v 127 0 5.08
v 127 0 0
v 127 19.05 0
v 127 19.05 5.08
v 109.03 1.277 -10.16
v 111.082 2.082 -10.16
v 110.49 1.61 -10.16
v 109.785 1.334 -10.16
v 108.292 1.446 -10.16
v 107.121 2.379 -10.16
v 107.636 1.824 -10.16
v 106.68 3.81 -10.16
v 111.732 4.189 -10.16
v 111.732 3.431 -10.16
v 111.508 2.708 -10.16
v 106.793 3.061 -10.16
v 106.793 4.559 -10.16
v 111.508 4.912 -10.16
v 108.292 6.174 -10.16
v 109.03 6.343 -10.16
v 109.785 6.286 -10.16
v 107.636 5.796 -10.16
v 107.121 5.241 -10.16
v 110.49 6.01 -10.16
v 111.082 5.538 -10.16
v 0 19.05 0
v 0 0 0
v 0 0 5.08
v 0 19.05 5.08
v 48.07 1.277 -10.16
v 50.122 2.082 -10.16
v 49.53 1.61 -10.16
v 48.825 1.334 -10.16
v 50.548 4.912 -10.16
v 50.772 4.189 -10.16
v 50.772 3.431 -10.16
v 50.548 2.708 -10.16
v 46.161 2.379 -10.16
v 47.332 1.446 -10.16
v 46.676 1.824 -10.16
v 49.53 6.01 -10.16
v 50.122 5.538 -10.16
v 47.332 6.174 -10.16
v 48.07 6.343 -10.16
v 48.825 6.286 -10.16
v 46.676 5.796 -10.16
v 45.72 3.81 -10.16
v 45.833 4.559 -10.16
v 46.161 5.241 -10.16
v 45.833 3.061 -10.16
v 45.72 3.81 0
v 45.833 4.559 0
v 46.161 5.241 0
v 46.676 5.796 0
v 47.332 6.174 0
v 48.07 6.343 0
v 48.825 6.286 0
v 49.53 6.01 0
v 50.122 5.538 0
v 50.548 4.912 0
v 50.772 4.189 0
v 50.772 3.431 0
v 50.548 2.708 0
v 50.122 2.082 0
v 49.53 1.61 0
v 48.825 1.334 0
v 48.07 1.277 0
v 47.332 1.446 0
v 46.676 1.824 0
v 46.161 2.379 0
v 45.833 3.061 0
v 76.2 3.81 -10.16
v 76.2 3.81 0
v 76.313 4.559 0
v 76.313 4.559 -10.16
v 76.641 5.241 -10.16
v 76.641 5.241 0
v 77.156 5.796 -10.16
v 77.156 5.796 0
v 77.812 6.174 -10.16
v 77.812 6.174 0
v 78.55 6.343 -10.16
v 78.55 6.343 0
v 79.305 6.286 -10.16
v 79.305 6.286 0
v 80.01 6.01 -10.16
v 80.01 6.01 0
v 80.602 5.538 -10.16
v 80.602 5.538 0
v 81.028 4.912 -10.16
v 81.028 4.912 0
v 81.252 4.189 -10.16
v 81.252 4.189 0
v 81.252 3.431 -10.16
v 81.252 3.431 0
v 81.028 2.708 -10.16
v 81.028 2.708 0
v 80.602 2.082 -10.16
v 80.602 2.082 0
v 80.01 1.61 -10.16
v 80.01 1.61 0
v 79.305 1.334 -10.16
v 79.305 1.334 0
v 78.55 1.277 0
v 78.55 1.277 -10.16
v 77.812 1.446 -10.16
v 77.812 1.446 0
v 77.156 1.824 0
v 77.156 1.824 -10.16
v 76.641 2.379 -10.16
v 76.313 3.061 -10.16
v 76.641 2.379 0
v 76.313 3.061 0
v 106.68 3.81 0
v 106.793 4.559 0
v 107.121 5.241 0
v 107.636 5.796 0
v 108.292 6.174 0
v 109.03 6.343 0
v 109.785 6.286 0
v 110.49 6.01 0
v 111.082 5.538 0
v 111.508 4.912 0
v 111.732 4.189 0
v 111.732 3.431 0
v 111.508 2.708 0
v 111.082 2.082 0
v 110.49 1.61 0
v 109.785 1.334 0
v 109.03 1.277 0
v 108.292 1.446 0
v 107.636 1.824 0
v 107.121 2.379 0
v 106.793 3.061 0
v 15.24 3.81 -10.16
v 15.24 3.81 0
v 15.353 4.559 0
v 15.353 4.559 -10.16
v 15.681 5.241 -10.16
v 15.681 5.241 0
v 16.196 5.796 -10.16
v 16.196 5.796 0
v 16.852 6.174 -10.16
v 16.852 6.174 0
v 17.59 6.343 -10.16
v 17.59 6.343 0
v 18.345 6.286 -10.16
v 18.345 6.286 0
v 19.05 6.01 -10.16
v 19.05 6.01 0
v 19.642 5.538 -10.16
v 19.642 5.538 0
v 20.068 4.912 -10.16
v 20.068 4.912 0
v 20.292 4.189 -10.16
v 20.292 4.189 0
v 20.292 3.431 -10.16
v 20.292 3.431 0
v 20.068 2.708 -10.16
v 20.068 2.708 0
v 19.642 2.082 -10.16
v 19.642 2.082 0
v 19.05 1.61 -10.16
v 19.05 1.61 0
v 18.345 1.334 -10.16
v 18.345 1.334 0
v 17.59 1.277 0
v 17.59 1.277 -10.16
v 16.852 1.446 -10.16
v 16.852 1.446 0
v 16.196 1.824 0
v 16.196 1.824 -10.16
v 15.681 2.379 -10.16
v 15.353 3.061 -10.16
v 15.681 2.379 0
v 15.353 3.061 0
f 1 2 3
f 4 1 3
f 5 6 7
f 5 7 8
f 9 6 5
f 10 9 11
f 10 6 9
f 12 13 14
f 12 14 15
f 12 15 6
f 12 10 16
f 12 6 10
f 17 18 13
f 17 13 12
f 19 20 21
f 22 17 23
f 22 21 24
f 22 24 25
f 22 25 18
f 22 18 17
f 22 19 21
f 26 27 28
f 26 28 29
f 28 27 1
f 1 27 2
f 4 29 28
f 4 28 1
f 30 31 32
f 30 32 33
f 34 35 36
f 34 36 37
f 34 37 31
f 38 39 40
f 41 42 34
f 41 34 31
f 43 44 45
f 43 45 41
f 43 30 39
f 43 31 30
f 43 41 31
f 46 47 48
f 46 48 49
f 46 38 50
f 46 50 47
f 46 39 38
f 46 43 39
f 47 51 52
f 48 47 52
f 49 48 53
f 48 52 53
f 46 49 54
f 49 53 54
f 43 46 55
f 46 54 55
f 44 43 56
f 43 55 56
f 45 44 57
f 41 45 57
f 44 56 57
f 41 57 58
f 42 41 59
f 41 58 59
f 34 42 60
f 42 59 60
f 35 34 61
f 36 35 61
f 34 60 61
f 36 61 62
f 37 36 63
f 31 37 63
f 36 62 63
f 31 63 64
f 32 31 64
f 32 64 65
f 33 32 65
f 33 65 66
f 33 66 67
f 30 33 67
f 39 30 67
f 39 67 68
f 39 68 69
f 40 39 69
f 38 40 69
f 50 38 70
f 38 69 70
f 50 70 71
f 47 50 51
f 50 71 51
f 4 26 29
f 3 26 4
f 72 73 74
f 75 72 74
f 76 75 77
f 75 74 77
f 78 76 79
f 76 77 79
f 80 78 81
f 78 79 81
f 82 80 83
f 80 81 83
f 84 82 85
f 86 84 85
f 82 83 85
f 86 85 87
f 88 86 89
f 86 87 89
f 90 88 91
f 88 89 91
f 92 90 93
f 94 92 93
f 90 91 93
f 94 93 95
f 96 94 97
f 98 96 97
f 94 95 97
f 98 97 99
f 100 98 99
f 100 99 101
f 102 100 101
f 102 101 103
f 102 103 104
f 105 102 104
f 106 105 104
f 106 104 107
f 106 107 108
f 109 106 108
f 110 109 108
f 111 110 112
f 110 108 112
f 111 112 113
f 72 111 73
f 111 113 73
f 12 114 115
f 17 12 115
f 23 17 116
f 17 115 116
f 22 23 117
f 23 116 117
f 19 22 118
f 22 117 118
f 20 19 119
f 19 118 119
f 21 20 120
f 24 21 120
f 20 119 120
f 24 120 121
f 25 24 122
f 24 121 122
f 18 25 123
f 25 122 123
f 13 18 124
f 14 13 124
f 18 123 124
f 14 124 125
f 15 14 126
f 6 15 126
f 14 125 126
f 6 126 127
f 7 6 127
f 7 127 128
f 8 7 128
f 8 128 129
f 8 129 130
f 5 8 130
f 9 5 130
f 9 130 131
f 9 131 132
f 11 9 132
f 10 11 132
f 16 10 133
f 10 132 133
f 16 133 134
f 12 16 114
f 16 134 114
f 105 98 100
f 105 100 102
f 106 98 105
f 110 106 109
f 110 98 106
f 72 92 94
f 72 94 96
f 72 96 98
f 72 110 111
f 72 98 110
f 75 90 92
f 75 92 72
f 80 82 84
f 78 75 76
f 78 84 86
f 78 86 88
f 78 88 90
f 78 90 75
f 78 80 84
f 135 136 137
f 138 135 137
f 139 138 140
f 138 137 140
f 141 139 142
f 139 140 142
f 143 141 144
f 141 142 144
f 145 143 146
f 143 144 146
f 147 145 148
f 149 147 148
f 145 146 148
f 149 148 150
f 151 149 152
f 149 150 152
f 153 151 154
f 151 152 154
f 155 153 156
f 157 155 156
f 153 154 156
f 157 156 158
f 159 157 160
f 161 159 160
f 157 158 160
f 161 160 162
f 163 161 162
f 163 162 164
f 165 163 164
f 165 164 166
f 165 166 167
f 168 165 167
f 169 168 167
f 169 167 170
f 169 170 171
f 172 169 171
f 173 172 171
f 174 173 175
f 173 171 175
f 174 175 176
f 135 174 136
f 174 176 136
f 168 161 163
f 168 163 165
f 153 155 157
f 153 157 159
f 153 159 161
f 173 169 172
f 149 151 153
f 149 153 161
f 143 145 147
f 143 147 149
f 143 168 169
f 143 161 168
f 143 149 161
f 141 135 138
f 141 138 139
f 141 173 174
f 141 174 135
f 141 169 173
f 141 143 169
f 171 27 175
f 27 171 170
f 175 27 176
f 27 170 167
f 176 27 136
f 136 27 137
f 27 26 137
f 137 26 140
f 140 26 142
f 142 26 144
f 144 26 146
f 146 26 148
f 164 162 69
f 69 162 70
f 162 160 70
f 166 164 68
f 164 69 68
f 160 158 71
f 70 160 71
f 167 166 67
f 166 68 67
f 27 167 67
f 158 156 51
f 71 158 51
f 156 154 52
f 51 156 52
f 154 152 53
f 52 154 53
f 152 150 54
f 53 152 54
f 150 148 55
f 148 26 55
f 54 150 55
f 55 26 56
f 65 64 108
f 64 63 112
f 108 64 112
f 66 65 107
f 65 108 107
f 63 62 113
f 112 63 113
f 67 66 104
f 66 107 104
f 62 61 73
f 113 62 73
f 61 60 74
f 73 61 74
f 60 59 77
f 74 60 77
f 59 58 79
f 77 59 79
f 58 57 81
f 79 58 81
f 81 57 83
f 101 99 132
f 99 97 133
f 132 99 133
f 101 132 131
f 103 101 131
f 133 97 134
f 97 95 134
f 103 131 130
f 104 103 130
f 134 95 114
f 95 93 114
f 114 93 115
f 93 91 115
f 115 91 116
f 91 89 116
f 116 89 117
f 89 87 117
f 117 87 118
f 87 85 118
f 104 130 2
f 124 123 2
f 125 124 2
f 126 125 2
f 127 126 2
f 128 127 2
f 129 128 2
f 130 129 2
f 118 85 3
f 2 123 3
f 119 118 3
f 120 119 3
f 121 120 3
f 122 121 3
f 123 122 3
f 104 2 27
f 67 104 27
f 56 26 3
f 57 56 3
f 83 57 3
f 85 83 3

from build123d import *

# Parameters (mm, degrees)
SKETCH1_W           = 127
SKETCH1_H           = 19.05
BOSS_EXTRUDE1_DEPTH = 5.08
SKETCH2_R           = 2.54
BOSS_EXTRUDE2_DEPTH = 10.16


with BuildPart() as part:
    # Sketch1 → Boss-Extrude1 (new body)
    with BuildSketch(Plane.XY):
        with Locations((63.5, 9.525)):
            Rectangle(SKETCH1_W, SKETCH1_H)
    extrude(amount=BOSS_EXTRUDE1_DEPTH)

    # Sketch2 → Boss-Extrude2 (add)
    with BuildSketch(Plane(origin=(0, 0, 0), x_dir=(-1, 0, 0), z_dir=(0, 0, -1))):
        with Locations((-109.22, 3.81)):
            Circle(SKETCH2_R)
        with Locations((-78.74, 3.81)):
            Circle(SKETCH2_R)
        with Locations((-48.26, 3.81)):
            Circle(SKETCH2_R)
        with Locations((-17.78, 3.81)):
            Circle(SKETCH2_R)
    extrude(amount=BOSS_EXTRUDE2_DEPTH)


solid = part.part
